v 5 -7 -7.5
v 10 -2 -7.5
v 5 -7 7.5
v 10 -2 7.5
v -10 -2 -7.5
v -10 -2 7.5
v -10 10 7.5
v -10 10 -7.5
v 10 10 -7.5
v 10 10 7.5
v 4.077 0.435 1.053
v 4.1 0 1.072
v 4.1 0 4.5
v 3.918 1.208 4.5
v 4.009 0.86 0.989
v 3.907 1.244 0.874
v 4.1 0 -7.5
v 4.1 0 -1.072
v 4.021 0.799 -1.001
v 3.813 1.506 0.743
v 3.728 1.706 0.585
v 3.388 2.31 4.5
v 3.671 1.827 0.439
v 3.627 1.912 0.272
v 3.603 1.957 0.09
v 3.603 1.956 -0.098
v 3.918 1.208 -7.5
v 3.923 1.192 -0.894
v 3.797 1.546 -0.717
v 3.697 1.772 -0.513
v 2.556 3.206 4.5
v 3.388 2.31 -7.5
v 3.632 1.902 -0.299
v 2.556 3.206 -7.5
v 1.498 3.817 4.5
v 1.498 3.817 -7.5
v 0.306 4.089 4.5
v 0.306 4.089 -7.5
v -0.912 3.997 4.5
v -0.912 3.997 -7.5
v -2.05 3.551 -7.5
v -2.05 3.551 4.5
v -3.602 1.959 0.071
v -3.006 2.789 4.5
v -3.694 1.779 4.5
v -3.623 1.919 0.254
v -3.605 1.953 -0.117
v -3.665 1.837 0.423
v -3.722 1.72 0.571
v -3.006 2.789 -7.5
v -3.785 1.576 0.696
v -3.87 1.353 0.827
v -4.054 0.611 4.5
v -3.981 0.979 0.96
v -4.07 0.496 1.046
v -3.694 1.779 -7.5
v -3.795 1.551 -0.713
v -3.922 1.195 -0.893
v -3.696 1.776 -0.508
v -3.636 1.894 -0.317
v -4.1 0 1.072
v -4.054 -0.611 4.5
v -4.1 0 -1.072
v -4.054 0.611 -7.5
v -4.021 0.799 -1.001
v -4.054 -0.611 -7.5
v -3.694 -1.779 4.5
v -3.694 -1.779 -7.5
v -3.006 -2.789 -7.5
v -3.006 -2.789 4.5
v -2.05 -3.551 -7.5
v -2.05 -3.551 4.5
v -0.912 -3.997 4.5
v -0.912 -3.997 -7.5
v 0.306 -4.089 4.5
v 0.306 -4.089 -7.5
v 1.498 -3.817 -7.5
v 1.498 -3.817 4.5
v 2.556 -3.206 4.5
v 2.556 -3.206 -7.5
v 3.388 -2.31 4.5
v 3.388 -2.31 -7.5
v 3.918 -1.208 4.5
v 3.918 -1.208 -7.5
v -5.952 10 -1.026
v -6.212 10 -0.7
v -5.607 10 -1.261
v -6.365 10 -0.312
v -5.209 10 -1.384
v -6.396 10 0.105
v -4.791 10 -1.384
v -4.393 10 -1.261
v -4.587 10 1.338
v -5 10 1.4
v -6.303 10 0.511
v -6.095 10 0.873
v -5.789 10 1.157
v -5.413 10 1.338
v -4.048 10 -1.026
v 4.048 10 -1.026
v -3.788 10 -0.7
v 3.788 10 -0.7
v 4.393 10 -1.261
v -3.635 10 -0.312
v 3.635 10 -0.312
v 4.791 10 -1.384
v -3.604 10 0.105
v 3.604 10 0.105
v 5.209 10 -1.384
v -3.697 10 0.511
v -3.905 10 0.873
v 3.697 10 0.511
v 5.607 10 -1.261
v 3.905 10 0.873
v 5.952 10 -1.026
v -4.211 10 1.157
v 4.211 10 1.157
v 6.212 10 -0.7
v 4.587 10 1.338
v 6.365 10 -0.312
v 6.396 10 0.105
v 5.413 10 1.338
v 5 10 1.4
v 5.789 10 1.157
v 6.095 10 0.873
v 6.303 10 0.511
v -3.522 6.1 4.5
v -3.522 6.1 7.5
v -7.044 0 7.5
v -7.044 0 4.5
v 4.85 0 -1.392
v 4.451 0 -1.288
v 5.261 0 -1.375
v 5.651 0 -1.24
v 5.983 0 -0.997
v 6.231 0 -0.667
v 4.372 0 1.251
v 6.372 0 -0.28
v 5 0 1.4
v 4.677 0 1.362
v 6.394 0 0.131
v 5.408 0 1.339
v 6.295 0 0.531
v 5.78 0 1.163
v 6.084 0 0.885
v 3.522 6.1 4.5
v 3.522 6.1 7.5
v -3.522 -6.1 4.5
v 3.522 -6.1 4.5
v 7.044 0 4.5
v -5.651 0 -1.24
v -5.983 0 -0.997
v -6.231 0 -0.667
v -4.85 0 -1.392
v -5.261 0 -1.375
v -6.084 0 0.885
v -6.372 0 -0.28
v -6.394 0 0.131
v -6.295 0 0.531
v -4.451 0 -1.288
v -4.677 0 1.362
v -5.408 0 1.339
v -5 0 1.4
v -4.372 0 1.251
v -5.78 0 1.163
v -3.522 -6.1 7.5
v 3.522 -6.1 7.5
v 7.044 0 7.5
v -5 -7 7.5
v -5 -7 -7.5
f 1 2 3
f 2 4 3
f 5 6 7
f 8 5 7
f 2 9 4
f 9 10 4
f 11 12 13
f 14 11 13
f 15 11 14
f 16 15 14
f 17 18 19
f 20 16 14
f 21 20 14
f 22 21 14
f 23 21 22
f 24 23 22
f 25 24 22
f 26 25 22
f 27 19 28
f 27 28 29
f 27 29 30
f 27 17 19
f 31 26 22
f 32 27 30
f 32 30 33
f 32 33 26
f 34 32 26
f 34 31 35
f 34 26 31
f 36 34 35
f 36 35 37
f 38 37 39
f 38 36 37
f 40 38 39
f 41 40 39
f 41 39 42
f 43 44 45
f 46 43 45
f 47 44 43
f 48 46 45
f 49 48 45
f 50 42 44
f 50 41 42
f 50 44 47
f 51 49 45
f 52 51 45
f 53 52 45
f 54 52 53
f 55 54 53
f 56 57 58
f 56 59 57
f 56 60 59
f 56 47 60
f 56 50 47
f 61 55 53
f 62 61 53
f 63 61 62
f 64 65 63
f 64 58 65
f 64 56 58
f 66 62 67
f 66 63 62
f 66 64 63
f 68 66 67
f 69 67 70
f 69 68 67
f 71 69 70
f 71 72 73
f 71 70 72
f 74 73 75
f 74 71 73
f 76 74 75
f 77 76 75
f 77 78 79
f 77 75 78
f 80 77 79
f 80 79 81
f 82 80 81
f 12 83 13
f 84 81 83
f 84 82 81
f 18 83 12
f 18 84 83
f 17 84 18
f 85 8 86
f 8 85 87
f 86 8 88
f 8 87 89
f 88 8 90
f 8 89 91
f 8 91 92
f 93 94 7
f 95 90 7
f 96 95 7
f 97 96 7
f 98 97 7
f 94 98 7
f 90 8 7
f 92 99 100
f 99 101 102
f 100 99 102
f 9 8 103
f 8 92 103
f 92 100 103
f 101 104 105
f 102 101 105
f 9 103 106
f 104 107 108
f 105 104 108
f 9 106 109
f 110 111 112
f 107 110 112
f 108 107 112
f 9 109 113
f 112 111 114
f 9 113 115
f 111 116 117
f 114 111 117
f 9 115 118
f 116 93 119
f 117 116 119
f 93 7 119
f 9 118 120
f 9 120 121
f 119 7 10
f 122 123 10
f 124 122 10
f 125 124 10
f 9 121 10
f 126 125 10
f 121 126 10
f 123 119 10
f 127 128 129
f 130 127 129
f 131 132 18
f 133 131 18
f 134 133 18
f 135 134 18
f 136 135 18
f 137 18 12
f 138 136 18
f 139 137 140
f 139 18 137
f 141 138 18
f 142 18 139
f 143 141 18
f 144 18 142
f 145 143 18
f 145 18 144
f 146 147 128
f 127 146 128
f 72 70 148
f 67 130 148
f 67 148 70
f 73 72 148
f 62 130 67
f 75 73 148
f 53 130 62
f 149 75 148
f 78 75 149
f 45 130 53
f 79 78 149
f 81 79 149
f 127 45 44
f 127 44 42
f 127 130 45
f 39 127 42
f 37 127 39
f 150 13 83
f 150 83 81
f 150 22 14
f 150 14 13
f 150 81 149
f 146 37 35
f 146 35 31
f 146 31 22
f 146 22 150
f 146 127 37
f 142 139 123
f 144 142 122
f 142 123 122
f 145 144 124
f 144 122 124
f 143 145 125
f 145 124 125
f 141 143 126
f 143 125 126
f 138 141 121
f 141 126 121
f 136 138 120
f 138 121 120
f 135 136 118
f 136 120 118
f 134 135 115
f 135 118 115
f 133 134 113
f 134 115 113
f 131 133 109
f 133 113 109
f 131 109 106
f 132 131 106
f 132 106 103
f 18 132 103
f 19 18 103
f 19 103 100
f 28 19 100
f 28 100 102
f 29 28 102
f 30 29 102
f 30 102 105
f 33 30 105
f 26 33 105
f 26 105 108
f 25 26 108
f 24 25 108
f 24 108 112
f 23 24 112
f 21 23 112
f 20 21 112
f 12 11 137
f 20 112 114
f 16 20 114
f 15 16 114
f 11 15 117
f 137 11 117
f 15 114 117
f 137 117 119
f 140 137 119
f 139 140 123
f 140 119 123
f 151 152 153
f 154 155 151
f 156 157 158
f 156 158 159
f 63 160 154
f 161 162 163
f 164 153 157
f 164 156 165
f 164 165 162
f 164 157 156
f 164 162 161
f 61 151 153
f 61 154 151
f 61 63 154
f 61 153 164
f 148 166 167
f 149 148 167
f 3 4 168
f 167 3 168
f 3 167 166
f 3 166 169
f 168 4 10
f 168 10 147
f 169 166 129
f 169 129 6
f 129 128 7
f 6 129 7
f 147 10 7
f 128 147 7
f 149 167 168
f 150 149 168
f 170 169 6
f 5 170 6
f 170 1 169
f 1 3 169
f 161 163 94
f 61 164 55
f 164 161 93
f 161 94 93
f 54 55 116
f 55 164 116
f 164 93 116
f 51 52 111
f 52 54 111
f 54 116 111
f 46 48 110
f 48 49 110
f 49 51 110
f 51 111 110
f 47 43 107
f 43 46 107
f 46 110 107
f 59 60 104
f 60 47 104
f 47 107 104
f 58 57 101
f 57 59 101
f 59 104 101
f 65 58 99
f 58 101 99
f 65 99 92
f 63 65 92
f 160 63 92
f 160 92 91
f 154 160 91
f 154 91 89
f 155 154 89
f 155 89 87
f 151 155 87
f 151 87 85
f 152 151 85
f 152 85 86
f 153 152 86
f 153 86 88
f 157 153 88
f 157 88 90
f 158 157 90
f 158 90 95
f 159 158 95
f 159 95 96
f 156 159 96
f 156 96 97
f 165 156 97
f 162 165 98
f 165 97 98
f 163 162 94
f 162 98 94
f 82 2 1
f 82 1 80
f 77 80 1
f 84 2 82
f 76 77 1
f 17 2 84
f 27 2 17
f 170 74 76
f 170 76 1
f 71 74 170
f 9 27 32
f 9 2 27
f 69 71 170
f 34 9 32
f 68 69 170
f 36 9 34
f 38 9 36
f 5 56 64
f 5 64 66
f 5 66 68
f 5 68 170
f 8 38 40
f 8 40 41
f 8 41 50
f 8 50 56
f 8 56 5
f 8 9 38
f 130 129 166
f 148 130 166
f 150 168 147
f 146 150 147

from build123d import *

# Parameters (mm, degrees)
SKETCH_1_R          = 4.1
EXTRUDE_1_DEPTH     = 7.5
CUT_EXTRUDE_1_DEPTH = 3
SKETCH_3_R          = 1.4
CUT_EXTRUDE_4_DEPTH = 10


with BuildPart() as part:
    # 草图1 → 凸台-拉伸1 (new, symmetric)
    with BuildSketch(Plane.XY):
        Polygon((-10, 10), (10, 10), (10, -2), (5, -7), (-5, -7), (-10, -2), align=None)
        Circle(SKETCH_1_R, mode=Mode.SUBTRACT)
    extrude(amount=EXTRUDE_1_DEPTH, both=True)

    # 草图2 → 切除-拉伸1 (cut)
    with BuildSketch(Plane.XY.offset(7.5)):
        Polygon((7.043673284, 0), (3.521836642, 6.1), (-3.521836642, 6.1), (-7.043673284, 0), (-3.521836642, -6.1), (3.521836642, -6.1), align=None)
    extrude(amount=-CUT_EXTRUDE_1_DEPTH, mode=Mode.SUBTRACT)

    # 草图3 → 切除-拉伸4 (cut)
    with BuildSketch(Plane(origin=(0, 10, 0), x_dir=(1, 0, 0), z_dir=(0, 1, 0))):
        with Locations(Location((5, 0, 0), (0, 0, 270))):
            Circle(SKETCH_3_R)
        with Locations(Location((-5, 0, 0), (0, 0, 270))):
            Circle(SKETCH_3_R)
    extrude(amount=-CUT_EXTRUDE_4_DEPTH, mode=Mode.SUBTRACT)


solid = part.part
